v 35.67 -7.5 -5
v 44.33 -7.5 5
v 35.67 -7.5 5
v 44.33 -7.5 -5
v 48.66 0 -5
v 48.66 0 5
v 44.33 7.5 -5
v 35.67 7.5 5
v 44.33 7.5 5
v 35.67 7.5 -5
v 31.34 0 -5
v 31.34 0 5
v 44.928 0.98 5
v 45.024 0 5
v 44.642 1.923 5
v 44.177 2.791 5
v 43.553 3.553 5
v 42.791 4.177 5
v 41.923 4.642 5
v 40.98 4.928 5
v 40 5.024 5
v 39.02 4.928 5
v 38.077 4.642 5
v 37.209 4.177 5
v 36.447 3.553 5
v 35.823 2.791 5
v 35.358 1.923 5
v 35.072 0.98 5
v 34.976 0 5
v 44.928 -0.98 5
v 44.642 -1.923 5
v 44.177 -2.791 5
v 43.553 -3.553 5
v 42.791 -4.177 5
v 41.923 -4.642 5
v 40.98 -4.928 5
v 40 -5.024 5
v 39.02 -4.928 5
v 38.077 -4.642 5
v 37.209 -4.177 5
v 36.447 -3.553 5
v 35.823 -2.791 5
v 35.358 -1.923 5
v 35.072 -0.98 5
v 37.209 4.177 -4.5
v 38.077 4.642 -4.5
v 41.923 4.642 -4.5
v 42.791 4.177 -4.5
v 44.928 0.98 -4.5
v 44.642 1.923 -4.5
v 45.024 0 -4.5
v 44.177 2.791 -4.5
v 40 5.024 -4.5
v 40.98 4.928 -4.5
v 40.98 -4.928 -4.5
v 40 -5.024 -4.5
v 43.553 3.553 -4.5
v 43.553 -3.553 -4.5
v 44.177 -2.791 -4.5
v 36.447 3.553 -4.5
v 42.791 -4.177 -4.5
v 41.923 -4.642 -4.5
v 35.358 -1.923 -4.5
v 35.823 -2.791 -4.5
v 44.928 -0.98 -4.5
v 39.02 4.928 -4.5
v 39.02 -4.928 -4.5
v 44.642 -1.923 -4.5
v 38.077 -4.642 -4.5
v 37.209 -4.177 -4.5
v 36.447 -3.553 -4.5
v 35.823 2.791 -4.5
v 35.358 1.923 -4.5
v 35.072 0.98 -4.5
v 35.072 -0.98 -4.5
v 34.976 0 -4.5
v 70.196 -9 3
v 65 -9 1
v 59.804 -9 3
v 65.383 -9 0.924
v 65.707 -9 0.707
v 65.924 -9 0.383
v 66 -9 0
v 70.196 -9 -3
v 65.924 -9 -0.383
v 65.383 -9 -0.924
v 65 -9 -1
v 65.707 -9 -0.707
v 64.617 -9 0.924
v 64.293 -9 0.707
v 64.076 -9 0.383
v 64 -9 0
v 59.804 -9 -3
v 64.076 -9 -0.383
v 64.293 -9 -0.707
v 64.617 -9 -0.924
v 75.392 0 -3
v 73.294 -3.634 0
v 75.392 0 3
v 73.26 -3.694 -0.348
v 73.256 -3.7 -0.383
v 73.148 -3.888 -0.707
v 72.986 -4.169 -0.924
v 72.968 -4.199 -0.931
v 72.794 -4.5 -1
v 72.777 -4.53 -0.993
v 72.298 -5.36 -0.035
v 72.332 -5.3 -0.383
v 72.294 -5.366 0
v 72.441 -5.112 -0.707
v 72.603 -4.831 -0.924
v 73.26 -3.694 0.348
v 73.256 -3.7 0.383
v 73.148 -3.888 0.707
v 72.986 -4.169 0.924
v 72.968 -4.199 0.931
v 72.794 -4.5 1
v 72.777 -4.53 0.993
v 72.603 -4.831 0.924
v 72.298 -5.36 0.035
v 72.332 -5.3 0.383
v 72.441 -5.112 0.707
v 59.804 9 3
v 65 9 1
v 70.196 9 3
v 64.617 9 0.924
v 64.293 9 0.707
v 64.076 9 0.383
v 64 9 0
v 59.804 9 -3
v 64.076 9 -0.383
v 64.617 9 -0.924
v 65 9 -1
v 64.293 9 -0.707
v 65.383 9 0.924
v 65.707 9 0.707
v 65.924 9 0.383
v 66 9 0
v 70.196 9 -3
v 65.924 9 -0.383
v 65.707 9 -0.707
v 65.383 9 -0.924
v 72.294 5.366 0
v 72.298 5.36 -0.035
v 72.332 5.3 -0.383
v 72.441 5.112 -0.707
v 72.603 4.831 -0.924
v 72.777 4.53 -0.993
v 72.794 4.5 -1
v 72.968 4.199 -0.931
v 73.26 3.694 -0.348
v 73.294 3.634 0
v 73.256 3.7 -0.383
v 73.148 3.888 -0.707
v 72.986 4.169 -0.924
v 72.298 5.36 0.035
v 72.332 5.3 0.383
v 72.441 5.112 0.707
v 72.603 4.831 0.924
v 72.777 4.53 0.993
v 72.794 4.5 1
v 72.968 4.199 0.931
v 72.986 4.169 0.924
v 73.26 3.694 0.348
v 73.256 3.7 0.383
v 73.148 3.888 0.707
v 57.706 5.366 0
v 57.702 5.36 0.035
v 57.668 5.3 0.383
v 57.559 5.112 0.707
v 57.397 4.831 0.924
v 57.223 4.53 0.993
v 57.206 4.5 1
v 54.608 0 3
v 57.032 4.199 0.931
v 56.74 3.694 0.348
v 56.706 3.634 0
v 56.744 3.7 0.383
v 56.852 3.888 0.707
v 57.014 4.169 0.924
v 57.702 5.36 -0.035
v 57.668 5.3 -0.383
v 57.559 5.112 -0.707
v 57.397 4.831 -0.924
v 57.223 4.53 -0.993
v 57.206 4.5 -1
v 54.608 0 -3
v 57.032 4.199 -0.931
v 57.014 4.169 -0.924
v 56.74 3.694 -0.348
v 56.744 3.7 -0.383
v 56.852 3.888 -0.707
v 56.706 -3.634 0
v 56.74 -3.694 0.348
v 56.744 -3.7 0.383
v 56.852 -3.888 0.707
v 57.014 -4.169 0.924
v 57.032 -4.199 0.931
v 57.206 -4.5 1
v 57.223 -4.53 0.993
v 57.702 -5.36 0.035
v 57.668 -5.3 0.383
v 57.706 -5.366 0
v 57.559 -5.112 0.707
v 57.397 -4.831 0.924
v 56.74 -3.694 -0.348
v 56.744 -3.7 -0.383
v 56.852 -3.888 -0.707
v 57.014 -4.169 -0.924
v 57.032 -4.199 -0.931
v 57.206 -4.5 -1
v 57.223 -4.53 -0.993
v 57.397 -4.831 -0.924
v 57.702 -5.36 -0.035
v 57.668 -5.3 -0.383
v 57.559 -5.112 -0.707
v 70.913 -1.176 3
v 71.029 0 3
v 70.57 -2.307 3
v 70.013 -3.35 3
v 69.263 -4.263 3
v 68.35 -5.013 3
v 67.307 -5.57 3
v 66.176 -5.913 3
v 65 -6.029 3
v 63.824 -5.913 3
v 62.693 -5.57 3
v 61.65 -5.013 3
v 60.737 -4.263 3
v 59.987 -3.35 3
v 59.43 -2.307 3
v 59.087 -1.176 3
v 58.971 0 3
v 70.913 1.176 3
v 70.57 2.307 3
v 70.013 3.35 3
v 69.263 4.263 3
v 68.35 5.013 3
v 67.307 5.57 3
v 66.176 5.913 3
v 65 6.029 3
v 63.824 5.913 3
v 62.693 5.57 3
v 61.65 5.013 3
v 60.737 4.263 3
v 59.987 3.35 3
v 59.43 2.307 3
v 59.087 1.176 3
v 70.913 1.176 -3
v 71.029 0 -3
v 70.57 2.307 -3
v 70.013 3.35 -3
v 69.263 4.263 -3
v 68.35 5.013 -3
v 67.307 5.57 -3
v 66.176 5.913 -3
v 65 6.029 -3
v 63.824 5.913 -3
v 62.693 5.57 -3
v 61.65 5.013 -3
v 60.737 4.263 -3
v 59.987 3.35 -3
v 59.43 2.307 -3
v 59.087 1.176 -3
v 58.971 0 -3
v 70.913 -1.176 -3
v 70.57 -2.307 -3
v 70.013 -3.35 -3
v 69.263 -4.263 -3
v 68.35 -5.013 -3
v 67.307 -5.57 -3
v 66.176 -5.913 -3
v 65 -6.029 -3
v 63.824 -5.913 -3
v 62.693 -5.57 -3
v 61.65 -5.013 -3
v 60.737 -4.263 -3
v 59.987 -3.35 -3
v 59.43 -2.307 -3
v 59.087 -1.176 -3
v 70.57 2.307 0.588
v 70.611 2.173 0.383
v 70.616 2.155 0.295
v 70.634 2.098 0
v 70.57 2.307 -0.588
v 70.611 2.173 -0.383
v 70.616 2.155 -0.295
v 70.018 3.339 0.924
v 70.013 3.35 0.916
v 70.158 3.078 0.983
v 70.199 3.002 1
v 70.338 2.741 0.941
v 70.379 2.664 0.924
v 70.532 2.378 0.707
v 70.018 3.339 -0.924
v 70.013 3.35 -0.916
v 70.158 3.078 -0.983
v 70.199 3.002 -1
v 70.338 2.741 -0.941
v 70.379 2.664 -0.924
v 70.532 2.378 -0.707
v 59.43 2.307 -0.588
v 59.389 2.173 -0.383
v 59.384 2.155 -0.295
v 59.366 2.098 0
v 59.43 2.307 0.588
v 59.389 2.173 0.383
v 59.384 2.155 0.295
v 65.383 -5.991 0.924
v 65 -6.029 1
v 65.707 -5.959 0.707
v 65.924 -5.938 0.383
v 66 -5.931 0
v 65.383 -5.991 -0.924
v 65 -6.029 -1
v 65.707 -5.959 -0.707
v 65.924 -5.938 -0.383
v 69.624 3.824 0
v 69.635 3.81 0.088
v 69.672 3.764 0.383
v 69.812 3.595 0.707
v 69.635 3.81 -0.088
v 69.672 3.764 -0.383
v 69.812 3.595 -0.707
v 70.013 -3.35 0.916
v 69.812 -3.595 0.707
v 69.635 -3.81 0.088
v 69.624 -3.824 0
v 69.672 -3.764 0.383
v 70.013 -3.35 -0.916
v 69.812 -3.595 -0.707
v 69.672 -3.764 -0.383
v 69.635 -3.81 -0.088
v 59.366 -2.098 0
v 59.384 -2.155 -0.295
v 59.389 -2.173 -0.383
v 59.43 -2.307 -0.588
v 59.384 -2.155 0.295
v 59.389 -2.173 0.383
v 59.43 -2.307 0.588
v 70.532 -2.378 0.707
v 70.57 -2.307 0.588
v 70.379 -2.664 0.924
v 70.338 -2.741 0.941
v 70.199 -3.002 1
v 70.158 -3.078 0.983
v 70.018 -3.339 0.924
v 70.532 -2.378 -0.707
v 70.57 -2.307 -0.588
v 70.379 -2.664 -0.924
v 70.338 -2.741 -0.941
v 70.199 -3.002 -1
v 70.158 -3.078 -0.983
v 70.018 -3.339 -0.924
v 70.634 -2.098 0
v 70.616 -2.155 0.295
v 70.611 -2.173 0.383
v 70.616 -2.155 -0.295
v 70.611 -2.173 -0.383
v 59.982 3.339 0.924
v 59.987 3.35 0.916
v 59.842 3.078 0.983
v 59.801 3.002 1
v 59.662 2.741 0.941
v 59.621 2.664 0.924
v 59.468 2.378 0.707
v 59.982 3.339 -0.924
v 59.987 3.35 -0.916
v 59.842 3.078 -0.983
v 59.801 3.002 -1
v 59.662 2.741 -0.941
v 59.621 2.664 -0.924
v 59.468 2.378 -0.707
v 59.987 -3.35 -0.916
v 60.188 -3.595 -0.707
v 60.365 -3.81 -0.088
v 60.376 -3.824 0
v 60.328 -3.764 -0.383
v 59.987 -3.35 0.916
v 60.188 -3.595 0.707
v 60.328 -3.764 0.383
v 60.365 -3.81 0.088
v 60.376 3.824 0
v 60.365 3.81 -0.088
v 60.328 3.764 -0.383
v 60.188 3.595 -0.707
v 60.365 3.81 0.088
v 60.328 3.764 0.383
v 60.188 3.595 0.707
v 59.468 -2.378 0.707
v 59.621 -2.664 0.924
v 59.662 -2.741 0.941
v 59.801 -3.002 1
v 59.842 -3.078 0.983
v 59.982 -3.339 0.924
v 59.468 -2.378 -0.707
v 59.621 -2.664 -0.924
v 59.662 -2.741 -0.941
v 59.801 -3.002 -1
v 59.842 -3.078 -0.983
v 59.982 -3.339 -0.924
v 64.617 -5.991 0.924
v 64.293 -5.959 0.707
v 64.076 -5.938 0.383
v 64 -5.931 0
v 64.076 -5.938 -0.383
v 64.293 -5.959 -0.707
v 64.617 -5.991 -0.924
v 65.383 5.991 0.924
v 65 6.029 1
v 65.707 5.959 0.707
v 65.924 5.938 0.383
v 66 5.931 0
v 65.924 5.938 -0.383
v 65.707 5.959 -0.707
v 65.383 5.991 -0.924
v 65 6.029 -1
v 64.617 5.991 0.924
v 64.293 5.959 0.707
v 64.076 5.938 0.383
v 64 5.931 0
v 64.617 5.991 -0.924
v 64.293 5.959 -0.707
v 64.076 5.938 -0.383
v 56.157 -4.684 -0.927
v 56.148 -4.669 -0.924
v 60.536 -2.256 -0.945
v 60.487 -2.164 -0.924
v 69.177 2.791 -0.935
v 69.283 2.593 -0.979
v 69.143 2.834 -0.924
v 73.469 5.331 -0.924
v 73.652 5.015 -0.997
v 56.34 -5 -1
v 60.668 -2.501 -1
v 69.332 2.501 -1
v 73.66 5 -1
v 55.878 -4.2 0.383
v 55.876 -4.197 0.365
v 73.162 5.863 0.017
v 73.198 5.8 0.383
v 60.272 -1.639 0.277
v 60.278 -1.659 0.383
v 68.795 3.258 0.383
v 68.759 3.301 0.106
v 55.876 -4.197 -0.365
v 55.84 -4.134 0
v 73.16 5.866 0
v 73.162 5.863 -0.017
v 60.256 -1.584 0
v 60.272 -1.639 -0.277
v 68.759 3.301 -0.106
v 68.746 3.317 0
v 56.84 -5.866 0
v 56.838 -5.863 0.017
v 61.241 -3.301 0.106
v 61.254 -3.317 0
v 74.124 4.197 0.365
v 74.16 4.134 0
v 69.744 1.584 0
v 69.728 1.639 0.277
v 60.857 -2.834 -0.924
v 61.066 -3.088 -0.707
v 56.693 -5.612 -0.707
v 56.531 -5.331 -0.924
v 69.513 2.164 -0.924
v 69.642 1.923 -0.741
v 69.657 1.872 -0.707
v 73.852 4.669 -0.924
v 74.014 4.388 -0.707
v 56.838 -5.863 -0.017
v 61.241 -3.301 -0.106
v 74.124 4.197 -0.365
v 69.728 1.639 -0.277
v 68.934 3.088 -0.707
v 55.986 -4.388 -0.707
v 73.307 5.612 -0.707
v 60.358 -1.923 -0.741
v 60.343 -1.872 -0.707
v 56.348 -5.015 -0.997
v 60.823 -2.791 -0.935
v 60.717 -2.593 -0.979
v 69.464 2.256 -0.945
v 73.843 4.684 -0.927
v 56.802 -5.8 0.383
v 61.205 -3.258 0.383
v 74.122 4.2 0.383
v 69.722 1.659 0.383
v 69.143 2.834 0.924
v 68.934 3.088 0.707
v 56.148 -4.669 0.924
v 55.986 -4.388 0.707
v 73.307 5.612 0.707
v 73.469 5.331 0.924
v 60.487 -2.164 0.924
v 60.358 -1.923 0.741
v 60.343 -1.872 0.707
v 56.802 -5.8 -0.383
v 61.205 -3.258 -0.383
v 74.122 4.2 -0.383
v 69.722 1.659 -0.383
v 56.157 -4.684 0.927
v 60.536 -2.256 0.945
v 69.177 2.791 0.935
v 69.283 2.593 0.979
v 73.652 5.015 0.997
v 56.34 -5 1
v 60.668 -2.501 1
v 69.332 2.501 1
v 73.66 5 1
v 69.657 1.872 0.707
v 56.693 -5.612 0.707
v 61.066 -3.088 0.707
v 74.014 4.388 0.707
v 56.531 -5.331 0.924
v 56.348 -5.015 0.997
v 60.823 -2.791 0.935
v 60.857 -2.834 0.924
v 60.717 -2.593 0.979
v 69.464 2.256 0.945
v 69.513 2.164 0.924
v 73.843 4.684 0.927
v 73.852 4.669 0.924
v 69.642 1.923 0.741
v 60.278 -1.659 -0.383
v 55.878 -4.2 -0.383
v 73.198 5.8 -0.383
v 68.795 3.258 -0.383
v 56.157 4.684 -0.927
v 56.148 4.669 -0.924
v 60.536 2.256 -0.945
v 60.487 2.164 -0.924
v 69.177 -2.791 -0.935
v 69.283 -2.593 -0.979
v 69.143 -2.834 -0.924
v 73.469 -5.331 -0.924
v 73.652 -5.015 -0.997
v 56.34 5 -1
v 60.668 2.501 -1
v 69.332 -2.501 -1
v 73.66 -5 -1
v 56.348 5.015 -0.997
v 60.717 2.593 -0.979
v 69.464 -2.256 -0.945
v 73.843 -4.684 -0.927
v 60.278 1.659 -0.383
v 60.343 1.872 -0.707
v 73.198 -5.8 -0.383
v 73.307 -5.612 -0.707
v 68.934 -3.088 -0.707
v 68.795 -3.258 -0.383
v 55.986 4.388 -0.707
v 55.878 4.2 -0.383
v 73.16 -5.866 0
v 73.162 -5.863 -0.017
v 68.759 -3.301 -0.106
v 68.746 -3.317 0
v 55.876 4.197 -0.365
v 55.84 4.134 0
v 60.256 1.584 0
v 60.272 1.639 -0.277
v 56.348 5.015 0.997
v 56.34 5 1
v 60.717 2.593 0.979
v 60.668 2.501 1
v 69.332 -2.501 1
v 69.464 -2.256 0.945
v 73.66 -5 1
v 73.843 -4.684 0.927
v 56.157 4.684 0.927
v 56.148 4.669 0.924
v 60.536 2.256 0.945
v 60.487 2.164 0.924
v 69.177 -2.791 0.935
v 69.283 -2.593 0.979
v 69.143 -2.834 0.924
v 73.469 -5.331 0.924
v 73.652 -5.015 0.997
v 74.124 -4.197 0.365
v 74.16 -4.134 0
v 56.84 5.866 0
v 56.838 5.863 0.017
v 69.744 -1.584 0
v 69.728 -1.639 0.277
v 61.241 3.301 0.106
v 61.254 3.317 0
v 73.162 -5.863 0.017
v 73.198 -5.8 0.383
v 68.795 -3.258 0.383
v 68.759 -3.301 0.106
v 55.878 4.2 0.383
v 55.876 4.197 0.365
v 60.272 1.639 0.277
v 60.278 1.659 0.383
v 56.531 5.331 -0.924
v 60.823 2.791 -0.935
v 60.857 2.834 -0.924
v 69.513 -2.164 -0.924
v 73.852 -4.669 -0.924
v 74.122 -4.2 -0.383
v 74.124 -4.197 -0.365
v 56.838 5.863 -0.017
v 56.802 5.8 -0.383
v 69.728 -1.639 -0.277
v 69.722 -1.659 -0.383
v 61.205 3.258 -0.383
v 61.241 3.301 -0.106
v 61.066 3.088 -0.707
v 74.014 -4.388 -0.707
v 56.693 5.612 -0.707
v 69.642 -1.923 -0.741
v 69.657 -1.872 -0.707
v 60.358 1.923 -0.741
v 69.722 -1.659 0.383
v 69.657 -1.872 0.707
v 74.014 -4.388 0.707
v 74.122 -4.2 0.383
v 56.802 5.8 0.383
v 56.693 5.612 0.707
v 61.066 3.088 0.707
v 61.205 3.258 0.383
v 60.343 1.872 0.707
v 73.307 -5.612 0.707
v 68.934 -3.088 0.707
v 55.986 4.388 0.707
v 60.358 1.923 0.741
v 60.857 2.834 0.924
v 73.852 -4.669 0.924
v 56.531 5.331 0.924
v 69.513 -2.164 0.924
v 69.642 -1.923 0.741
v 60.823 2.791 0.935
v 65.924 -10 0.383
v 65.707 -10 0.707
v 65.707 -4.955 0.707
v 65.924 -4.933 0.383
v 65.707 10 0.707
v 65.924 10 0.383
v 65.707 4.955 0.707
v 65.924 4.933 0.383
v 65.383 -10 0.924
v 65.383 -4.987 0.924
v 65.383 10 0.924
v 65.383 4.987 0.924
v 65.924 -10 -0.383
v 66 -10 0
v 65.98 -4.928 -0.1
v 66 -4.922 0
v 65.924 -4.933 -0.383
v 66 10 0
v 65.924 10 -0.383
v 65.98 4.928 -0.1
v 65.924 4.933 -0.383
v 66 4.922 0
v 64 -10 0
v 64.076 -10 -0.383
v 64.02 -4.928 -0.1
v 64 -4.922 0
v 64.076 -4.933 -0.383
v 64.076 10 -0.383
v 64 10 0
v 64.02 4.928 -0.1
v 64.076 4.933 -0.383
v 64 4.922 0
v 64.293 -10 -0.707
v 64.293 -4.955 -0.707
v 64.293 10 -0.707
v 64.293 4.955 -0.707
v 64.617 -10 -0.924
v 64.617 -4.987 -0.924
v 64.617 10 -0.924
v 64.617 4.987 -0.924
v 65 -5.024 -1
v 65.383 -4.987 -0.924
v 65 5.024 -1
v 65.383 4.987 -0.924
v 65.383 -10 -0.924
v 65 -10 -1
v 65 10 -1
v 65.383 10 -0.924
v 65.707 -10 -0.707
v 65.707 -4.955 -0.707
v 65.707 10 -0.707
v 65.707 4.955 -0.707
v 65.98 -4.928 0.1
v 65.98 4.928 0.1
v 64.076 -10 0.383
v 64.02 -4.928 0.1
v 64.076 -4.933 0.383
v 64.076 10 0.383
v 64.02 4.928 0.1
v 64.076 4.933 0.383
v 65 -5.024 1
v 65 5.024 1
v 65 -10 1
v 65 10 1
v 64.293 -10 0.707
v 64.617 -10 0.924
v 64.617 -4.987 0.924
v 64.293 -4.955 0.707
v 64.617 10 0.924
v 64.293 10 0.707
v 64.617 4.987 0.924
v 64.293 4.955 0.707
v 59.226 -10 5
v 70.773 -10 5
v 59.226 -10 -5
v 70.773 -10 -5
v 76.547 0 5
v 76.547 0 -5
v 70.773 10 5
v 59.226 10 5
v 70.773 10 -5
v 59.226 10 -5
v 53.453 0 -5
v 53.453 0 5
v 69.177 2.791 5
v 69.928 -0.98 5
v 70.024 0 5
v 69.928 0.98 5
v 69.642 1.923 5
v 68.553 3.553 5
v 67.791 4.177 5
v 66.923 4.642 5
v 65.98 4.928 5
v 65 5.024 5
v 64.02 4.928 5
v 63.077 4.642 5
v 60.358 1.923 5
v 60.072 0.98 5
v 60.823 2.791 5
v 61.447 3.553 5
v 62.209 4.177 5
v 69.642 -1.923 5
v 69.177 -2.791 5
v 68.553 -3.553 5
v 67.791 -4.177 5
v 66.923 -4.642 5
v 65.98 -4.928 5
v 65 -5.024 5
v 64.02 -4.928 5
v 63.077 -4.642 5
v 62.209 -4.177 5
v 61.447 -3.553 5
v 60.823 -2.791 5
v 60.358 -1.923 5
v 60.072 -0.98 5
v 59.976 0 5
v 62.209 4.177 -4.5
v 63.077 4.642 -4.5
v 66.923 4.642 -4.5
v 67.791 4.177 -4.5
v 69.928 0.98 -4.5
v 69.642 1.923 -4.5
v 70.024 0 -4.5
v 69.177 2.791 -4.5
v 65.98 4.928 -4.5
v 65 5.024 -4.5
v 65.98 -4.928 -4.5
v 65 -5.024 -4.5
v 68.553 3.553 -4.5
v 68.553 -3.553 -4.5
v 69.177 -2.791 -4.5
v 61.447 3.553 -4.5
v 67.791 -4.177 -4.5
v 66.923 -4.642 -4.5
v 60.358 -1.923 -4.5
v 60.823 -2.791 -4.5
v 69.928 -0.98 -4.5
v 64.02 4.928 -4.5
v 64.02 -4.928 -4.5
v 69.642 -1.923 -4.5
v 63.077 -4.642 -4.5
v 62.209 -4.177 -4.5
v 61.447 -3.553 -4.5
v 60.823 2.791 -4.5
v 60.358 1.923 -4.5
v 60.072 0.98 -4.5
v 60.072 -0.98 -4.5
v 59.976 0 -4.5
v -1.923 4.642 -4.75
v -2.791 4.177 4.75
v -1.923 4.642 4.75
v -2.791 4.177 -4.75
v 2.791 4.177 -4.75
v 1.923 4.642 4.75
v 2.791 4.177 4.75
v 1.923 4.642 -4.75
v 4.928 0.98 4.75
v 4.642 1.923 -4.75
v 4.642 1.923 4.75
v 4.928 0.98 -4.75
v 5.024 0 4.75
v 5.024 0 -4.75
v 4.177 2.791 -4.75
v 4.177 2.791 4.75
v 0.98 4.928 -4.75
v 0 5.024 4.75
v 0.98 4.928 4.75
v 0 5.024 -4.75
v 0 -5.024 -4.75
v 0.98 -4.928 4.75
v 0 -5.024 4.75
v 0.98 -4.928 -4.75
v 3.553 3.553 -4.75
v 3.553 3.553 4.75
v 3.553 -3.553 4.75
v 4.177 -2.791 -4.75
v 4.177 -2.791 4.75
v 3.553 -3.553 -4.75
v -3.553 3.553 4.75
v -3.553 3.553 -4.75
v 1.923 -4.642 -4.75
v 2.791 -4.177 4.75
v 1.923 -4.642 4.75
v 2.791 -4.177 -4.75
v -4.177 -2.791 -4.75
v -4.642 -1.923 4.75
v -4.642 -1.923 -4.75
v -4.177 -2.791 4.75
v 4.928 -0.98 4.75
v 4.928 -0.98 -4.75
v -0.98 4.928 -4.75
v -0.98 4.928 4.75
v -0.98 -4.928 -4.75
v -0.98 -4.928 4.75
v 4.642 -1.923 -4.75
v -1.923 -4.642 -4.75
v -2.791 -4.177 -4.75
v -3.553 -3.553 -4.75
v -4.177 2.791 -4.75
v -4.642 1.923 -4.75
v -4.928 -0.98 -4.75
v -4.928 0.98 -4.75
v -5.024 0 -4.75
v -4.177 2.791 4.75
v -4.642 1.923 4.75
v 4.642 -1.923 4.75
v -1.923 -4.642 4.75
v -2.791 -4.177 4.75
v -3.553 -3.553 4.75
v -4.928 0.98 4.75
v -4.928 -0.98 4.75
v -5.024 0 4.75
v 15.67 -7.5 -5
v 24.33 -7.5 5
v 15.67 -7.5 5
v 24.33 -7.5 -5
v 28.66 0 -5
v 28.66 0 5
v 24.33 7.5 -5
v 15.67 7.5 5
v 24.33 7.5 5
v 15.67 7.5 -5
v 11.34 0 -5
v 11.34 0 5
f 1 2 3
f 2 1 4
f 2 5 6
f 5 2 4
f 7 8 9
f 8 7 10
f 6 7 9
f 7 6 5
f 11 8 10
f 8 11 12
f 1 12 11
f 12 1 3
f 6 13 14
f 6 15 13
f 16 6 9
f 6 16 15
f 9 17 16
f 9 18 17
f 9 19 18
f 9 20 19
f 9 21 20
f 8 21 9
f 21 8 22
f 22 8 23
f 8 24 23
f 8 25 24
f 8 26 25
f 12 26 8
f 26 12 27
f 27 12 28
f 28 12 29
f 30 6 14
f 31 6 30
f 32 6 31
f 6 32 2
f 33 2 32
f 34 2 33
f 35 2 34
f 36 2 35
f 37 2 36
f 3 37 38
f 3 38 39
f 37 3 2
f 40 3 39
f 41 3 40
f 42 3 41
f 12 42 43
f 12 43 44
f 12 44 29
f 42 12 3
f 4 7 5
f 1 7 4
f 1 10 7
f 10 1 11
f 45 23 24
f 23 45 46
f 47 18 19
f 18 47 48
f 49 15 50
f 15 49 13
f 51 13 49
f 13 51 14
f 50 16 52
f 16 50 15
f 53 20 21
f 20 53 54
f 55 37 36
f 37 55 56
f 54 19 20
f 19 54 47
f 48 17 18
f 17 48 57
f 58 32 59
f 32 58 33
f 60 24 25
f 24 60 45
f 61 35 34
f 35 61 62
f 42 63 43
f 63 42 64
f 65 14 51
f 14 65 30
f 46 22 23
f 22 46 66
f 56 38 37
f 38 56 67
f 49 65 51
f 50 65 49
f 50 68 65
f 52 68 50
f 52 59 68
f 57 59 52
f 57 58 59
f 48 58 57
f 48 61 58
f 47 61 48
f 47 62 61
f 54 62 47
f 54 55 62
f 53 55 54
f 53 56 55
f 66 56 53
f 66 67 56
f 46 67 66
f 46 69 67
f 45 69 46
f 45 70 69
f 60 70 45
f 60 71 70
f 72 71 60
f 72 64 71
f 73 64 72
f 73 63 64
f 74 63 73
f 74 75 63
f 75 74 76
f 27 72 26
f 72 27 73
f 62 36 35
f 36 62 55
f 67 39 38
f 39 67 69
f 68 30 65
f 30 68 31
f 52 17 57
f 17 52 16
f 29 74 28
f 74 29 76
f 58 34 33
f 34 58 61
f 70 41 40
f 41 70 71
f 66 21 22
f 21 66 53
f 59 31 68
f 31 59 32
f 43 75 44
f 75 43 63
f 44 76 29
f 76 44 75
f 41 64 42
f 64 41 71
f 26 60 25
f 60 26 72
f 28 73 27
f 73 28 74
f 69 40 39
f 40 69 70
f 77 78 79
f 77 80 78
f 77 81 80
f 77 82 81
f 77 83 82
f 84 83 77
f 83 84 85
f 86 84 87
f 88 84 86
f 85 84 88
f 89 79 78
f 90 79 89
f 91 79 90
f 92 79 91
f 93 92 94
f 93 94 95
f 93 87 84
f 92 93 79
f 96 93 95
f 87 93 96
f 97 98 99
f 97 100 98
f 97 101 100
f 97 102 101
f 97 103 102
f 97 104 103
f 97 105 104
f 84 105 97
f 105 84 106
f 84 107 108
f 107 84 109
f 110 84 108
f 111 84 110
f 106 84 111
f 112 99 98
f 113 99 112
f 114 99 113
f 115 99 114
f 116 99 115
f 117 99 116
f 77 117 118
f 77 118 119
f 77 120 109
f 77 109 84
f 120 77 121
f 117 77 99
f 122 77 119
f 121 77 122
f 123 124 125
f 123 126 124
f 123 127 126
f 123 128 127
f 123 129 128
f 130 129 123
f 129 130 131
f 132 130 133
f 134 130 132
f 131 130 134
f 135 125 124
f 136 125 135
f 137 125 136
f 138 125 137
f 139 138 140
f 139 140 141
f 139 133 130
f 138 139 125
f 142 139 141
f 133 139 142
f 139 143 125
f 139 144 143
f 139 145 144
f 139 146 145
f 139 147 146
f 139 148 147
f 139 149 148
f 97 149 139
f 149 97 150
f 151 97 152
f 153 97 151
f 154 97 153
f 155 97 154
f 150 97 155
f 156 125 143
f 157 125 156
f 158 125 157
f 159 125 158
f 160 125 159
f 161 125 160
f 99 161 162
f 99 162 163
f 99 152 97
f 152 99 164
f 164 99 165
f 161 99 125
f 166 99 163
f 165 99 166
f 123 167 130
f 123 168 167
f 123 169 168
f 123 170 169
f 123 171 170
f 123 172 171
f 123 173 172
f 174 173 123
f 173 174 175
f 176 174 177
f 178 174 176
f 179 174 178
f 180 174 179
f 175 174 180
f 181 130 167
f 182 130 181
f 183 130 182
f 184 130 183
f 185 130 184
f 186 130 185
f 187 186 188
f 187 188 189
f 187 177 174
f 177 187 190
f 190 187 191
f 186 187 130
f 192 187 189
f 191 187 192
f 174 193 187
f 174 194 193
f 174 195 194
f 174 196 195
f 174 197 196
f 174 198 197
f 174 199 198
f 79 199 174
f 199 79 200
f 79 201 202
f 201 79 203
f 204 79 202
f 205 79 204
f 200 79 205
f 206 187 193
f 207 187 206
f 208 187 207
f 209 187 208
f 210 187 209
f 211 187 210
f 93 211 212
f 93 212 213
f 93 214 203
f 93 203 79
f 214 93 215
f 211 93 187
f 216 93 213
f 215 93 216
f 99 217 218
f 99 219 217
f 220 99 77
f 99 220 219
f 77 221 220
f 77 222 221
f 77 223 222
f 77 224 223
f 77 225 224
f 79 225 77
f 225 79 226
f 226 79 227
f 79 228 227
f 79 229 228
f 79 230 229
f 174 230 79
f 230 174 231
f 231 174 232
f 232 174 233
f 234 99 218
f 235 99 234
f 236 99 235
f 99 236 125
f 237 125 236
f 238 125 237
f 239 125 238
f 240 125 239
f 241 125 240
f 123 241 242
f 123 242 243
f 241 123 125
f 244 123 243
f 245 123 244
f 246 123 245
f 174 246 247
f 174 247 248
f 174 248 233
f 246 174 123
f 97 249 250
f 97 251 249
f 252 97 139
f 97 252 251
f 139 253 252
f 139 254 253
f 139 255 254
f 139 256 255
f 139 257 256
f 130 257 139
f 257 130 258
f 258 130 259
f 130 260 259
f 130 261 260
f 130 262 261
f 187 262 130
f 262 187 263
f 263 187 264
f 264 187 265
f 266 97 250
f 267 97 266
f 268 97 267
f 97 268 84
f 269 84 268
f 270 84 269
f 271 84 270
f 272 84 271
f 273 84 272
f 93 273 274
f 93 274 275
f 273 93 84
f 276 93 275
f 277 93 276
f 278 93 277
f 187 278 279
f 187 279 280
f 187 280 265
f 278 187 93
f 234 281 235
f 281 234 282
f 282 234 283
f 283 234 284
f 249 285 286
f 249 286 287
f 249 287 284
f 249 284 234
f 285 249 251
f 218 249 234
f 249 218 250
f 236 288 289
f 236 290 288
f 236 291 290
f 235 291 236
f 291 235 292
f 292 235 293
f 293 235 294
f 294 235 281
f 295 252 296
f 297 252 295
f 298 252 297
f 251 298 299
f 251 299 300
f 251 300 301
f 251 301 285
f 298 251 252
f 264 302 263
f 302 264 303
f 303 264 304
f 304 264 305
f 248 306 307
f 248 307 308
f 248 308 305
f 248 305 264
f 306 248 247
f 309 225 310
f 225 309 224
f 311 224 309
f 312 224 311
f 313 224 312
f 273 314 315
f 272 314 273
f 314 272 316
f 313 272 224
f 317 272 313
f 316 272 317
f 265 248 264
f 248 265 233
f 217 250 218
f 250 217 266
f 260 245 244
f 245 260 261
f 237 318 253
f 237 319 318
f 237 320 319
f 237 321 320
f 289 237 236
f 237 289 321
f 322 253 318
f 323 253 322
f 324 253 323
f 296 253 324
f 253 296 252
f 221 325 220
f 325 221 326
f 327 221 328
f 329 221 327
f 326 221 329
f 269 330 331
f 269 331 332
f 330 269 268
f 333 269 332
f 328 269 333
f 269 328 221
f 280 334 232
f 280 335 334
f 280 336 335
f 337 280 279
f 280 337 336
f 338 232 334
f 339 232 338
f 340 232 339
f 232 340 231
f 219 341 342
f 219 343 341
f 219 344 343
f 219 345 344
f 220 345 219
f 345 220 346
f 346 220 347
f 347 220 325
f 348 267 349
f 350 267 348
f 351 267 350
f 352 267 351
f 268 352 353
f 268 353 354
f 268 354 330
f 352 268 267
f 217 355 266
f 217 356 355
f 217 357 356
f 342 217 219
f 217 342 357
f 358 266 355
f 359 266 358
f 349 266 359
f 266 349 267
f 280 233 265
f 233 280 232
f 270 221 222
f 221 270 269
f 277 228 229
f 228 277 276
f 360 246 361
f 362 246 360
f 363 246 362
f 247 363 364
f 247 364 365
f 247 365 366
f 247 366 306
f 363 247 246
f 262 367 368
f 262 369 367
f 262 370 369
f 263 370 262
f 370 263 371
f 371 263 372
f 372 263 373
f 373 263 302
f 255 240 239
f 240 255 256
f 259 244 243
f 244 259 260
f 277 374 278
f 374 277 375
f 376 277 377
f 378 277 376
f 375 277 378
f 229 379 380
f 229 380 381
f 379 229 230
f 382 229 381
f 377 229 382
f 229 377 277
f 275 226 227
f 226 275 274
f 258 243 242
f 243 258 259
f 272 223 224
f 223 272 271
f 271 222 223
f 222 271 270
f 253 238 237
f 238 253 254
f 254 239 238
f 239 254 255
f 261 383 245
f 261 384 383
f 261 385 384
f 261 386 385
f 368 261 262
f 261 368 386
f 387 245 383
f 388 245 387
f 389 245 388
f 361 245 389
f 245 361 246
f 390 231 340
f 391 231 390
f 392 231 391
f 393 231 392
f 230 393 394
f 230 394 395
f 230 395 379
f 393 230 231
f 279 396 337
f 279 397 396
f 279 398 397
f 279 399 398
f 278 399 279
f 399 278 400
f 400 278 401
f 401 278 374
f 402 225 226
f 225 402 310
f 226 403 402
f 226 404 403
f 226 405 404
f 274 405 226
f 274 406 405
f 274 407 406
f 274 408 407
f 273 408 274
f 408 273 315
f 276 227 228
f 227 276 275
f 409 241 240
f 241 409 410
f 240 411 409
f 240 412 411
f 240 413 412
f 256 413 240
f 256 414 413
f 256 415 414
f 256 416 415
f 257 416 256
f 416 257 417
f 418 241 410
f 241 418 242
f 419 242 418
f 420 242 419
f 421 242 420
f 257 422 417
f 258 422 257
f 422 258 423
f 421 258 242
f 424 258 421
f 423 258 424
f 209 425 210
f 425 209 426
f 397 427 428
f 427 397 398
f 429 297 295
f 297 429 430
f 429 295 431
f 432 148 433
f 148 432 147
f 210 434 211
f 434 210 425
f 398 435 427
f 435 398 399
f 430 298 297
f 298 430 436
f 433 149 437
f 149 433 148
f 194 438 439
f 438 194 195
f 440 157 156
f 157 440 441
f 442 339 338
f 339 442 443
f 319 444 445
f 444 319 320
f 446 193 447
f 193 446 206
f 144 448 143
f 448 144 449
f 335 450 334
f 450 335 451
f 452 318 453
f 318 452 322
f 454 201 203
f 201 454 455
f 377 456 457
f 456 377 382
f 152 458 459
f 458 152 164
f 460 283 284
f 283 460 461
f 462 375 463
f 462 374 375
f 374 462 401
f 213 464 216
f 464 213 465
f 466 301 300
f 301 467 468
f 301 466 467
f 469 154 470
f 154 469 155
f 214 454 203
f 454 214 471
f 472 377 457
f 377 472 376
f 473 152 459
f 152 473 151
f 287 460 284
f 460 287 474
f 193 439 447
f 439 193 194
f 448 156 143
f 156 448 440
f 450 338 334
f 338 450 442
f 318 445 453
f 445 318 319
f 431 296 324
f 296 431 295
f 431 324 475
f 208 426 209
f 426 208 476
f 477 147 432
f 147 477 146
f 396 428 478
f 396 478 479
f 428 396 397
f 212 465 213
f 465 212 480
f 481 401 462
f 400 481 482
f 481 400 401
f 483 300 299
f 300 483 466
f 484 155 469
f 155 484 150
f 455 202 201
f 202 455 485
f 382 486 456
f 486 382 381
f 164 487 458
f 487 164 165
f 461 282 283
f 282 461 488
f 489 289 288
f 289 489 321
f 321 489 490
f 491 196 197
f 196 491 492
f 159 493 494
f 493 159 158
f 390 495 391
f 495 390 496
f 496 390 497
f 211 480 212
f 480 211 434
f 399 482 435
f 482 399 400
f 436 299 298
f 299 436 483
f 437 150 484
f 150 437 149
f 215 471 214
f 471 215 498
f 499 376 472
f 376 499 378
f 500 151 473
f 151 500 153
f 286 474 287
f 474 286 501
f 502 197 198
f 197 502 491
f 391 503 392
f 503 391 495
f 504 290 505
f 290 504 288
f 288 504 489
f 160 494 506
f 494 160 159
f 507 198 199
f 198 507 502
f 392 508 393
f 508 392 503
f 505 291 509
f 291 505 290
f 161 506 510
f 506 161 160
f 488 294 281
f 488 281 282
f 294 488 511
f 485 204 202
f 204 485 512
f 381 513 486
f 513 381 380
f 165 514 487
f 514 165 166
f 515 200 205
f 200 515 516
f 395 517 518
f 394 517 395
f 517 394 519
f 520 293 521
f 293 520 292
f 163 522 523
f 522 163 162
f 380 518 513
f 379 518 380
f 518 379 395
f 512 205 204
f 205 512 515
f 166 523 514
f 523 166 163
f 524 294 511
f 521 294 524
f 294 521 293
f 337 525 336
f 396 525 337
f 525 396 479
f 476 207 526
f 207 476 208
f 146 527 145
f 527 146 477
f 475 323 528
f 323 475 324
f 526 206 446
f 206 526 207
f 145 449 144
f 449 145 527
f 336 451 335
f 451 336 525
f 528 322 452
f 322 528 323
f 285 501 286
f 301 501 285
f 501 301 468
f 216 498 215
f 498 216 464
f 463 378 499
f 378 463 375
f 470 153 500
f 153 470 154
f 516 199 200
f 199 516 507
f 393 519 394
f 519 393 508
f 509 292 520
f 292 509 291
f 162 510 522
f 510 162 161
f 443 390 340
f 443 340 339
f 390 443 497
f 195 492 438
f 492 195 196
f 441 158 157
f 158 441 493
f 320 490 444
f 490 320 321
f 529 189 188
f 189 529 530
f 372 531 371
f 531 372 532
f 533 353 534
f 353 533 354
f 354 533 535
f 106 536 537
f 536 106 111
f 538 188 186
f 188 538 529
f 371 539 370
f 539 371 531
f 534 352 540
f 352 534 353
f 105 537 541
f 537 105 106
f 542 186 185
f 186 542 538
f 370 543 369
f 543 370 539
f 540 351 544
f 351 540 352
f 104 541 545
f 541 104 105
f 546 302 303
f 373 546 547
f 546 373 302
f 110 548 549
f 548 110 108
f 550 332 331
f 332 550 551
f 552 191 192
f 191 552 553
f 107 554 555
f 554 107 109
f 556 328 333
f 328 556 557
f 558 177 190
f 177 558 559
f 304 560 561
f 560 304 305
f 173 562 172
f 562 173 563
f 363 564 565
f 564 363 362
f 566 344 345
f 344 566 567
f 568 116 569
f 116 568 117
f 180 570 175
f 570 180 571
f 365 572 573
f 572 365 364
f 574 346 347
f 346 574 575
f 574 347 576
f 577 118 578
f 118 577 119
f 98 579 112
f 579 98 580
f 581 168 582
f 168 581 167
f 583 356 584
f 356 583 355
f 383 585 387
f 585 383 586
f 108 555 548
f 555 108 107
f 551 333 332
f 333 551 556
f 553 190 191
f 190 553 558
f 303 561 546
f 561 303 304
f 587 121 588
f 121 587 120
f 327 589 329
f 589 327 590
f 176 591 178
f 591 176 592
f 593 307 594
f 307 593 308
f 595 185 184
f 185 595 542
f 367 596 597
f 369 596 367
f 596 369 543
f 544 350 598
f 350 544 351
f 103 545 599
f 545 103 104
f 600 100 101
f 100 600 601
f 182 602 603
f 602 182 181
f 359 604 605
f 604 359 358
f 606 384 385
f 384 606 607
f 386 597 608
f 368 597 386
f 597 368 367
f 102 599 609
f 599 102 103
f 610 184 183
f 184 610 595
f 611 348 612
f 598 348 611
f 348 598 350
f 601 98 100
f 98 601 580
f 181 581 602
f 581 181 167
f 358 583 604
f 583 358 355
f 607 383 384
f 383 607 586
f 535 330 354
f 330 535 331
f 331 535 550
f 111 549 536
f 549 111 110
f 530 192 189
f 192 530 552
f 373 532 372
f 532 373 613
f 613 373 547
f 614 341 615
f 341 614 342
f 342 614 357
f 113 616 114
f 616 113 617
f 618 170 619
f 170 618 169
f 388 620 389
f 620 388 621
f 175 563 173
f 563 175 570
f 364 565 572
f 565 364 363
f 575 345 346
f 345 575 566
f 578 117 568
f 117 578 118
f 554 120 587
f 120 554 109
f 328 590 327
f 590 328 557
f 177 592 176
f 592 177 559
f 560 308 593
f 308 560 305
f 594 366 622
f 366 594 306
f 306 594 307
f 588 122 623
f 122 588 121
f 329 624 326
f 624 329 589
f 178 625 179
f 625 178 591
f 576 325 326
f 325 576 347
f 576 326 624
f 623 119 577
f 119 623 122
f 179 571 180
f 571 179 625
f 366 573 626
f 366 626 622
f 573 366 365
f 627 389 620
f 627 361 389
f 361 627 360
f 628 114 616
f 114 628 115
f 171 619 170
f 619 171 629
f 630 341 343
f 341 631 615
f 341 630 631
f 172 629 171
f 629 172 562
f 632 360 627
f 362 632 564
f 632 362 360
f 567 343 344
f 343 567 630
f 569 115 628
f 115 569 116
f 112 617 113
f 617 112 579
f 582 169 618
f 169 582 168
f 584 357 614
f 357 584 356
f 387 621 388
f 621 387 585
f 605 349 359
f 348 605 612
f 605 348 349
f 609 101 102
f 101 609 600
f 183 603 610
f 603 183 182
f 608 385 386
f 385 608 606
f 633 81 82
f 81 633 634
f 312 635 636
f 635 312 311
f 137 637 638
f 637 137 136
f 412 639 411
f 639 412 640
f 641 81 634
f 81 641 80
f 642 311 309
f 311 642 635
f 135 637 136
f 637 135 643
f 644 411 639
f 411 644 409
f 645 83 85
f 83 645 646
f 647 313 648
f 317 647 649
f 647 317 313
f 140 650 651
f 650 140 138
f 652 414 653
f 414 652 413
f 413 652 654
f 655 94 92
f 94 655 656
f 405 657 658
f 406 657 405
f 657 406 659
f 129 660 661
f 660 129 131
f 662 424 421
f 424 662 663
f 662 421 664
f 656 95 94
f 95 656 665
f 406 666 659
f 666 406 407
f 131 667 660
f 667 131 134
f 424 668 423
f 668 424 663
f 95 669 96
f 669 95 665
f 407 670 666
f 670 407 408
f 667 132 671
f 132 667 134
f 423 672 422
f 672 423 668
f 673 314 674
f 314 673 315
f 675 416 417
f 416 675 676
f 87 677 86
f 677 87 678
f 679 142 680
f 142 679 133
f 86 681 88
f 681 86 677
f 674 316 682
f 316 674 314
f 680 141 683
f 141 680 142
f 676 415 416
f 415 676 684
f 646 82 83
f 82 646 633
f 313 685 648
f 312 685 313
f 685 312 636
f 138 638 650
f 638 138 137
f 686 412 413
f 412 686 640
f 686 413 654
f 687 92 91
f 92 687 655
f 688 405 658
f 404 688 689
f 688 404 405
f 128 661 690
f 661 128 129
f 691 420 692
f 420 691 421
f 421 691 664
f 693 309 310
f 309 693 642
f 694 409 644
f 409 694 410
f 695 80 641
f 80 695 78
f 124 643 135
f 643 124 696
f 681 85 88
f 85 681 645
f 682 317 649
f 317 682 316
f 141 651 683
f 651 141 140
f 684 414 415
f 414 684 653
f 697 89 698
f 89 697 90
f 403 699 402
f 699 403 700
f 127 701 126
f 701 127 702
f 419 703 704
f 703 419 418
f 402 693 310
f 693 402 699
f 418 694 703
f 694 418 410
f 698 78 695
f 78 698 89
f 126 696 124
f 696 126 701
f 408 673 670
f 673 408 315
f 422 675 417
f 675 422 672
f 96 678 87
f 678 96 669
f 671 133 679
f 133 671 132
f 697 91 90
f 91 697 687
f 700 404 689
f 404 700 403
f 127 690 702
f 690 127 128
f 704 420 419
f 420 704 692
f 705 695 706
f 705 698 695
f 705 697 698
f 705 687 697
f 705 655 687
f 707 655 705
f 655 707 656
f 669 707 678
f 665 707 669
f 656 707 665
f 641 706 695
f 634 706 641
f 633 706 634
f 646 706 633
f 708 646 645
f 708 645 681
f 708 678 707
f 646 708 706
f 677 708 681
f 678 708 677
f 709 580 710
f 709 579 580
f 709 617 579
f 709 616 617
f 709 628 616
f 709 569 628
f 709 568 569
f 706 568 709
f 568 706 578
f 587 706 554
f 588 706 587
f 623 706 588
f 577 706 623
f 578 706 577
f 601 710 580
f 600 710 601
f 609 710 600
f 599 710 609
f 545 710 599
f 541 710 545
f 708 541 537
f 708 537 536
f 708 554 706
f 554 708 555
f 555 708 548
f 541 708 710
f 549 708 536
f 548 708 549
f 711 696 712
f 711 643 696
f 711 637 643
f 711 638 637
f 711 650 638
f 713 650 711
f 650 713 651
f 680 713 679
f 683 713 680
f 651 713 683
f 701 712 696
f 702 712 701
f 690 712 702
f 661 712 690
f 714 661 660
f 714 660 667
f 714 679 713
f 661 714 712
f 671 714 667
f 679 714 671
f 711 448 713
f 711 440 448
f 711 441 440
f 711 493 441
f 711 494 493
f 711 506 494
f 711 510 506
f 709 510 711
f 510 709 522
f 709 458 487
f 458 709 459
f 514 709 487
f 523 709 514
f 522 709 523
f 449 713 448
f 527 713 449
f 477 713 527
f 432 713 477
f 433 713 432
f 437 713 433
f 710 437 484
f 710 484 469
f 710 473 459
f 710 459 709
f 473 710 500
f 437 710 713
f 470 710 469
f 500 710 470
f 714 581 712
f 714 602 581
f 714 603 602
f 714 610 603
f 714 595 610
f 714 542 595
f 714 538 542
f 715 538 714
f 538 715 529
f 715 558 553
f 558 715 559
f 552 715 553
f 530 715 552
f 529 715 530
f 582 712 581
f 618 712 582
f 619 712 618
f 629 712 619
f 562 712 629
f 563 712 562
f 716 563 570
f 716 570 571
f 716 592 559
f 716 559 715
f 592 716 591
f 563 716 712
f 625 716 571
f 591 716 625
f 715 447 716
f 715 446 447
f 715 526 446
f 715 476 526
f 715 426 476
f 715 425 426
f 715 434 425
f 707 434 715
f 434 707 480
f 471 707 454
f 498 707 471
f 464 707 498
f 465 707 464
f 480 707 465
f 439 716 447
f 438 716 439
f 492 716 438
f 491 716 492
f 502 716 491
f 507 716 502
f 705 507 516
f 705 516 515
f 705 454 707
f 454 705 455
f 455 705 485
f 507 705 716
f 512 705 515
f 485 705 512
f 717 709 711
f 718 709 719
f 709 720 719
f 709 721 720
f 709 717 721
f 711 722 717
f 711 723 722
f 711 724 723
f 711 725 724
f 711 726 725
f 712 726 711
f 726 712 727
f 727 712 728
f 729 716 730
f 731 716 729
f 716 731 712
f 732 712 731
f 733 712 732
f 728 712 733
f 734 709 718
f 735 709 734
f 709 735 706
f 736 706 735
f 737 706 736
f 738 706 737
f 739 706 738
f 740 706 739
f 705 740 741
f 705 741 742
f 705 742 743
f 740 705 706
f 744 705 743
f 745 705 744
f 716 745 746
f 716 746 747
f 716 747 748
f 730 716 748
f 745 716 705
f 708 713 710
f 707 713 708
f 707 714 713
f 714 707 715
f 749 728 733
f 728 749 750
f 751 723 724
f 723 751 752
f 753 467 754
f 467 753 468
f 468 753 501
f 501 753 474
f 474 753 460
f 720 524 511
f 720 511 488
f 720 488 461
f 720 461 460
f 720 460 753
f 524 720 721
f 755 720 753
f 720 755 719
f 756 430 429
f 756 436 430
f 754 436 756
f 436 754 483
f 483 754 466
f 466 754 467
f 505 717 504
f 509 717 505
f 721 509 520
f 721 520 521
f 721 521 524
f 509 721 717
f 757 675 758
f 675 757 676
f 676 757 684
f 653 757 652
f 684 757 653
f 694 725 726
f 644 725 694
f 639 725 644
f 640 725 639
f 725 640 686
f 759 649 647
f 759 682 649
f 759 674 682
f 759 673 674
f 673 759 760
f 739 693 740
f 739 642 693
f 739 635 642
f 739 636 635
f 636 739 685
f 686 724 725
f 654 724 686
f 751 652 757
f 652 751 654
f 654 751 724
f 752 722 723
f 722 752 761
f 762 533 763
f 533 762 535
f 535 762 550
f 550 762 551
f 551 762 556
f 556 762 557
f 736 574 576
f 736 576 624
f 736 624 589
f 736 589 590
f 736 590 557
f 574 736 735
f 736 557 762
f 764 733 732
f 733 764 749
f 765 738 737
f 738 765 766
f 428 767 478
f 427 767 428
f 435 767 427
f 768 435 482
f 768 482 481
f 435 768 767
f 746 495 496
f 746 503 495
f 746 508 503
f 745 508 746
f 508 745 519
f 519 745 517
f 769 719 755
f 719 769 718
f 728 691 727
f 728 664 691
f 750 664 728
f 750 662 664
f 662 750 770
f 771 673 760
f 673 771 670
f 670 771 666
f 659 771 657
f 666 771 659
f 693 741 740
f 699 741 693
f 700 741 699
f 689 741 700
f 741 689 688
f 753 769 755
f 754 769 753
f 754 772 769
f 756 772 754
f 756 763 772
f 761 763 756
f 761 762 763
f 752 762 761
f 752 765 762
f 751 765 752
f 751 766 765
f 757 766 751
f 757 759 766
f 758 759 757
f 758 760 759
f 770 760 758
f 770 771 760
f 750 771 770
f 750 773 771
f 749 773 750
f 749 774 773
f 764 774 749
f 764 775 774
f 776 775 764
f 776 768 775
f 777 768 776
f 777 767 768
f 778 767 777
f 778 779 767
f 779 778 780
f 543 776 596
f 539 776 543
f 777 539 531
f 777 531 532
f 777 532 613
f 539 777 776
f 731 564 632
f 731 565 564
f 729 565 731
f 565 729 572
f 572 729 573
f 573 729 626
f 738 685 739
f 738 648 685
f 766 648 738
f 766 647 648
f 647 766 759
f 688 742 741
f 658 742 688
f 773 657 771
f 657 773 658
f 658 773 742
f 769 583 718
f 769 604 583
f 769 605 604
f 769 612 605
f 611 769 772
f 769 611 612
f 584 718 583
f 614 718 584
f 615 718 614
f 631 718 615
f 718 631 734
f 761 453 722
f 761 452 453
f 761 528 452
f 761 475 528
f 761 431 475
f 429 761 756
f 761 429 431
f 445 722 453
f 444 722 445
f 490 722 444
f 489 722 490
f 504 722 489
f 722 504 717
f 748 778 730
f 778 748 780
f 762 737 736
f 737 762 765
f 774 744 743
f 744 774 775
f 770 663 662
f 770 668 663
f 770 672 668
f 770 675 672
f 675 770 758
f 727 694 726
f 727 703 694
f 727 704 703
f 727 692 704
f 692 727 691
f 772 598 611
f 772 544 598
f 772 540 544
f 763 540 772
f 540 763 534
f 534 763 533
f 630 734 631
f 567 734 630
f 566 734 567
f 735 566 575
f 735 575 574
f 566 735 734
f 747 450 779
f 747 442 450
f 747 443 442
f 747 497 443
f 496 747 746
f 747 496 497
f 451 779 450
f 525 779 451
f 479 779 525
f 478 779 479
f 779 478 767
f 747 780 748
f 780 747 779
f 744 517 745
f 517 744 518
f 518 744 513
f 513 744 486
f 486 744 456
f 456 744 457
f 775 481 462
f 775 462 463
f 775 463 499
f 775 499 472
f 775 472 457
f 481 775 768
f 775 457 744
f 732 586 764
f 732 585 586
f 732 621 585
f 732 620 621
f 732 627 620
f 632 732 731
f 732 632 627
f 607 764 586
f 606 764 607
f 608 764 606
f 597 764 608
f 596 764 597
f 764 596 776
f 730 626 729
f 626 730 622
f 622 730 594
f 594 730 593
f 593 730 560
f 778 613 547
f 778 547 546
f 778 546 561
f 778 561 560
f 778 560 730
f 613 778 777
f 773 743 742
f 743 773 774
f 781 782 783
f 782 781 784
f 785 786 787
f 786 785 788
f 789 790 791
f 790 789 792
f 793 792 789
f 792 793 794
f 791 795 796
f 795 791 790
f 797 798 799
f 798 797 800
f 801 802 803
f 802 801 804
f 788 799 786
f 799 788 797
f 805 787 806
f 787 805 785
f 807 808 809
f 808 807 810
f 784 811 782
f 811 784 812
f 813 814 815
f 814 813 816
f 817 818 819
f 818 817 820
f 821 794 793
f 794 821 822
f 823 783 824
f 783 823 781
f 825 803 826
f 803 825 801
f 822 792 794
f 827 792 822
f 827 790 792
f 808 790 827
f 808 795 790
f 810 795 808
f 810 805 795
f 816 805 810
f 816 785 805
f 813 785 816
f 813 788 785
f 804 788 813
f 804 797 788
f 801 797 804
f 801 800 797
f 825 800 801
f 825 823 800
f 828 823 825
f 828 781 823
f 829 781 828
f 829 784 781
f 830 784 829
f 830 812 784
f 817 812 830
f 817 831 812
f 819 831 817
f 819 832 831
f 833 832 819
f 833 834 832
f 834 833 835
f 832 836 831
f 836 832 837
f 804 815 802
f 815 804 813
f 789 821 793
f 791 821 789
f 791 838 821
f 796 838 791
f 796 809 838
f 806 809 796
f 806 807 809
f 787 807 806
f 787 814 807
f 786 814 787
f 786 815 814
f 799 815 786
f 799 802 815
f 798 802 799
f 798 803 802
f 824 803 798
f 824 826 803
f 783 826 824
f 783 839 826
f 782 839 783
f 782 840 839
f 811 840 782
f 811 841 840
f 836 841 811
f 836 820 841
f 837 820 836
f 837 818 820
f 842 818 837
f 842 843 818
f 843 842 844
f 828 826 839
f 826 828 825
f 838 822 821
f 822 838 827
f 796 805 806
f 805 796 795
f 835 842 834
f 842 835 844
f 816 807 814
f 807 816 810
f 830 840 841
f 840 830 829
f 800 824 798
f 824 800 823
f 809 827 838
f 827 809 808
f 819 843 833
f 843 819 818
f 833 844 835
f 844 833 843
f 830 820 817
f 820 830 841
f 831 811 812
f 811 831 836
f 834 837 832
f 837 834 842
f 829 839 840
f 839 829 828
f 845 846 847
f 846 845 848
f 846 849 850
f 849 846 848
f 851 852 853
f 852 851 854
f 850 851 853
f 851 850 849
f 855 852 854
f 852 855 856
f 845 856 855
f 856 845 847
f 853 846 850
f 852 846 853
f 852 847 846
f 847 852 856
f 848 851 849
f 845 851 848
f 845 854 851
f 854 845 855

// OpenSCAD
// file: util.scad
use <tests.scad>

module cylinder_outer( h, r=undef, d=undef, center=true, fn=$fn) {
   if ( is_undef(r) && is_undef(d) ) {
     assert(false,"must specify r or d when calling cylinder_outer");
   }
   radius = is_undef(r) ? d/2 : r;
   fudge = 1 / cos( 180 / fn );
   
   echo(str("DEBUG: making outer cylinder - radius: ", radius, "; fudge", fudge, "; fn:", fn));
   cylinder( h=h, r=radius*fudge, center=center, $fn=fn );
}

module reduce_moire(direction=[0,0,1]) {
    translate( 1/128 * direction )
    children();
}


/**
 * add_tolerance
 * 
 * adds a specified amount to an object dimension
 * 
 * object_size: the original object dimension
 * tolerance: (scoped*) the amount to add
 */
__add_tolerance = function( object_size, tolerance = $scoped_tolerance ) (
    object_size + ( is_undef(tolerance) ? 0 : tolerance )
);
function add_tolerance( object_size, tolerance = $scoped_tolerance ) =
    __add_tolerance( object_size, tolerance );

/**
 * subtract_tolerance
 * 
 * removes a specified amount from an object
 * 
 * object_size: the original object dimension
 * tolerance: (scoped*) the amount to remove
 */
__subtract_tolerance = function( object_size, tolerance = $scoped_tolerance ) (
    object_size - ( is_undef(tolerance) ? 0 : tolerance )
);
function subtract_tolerance( object_size, tolerance = $scoped_tolerance ) =
    __subtract_tolerance( object_size, tolerance );


__sum_list = function ( list, limit = undef, index = 0, sum = 0 ) (
    ! is_list(list) // this is essentially to prevent an infinite loop on failure
        ? 0
        : index >= ( is_num(limit) ? min( len(list), limit ) : len(list) )
        ? sum
        : is_num( list[index] ) // if the list has mixed values, don't include them
        ? __sum_list( list, limit, index + 1, sum + list[index] )
        : __sum_list( list, limit, index + 1, sum )
);
function sum_list( list, limit = undef, index = 0, sum = 0 ) =
    __sum_list(list,limit,index,sum);
    
__sae_list_to_mm = function ( list, precision = 2 ) (
  [ for( i = list ) sae_to_mm(i,precision) ]
);
function sae_list_to_mm( list, precision = 2 ) =
  __sae_list_to_mm( list, precision );

__sae_to_mm = function( inches, precision = 2 ) let (
    magnitude = pow( 10, precision )
) (
    round( magnitude * ( inches * 25.4 ) ) / magnitude
);
function sae_to_mm( inches, precision = 2 ) =
  __sae_to_mm( inches, precision );

__mm_to_sae = function( inches, precision = 2 ) let (
    magnitude = pow( 10, precision )
) (
    round( magnitude * ( 25.4 / mm ) ) / magnitude
);
function mm_to_sae( inches, precision = 2 ) =
  __mm_to_sae( inches, precision );

  
// the following tests will be run if you preview this file directly
  
mm_list  = [1,2,3,5,7,11,13,17,19,23,29];
in_list  = [3/16,1/2,3/4,29/32];
bad_list = ["mom",2,3,"steve",4,11,undef];

sum_tests = [ 
    [130,mm_list], 
    [1,mm_list,1], 
    [11,mm_list,4],
    [20,bad_list],
    [0,"not a list",0]
];
convert_tests = [
  [ [4.76,12.7,19.05,23.02], in_list ]
];

test_runner( __sum_list, sum_tests );
test_runner( __sae_list_to_mm, convert_tests );

echo("Successfully executed all util.scad tests");
// file: tests.scad
module test_runner( func, tests ) {
    for( test = tests ) {
        expected = test[0];
        if ( len( test ) > 9 ) {
            echo("WARNING: A test was performed with more than 8 parameters, all additional parameters are ignored.");
        };
        value = len( test ) == 1 ? func() 
              : len( test ) == 2 ? func(test[1])
              : len( test ) == 3 ? func(test[1],test[2])
              : len( test ) == 4 ? func(test[1],test[2],test[3])
              : len( test ) == 5 ? func(test[1],test[2],test[3],test[4])
              : len( test ) == 6 ? func(test[1],test[2],test[3],test[4],test[5])
              : len( test ) == 7 ? func(test[1],test[2],test[3],test[4],test[5],test[6])
              : len( test ) == 8 ? func(test[1],test[2],test[3],test[4],test[5],test[6],test[7])
              : func(test[1],test[2],test[3],test[4],test[5],test[6],test[7],test[8]);
        
        assert( value == expected, str("expected: ", expected, "; received: ", value ) );
    }
}
// file: defaults.scad
use <util.scad>

module use_all_defaults() {
  use_general_defaults() 
  use_socket_defaults() 
  use_label_defaults() 
  use_magnet_defaults()
  children();
}

module use_general_defaults() {
    $scoped_tolerance = 0;
    $scoped_for_resin = false;
    $scoped_resin_wall_max_width = 3;
    children();
}

module use_tolerance(value) {
    $scoped_tolerance = value;
    children();
}

module resin_print(value=true) {
    $scoped_for_resin = value;
    children();
}

// sockets.scad
module use_socket_defaults() {
    $scoped_sockets = undef;
    $scoped_socket_set_width = undef;
    $scoped_socket_depth = 10;
    $scoped_socket_drive = false;
    $scoped_socket_drive_tolerance = 0.5;
    $scoped_socket_drive_magnet = undef;
    children();
}

module use_sockets(value) {
    $scoped_sockets = value;
    children();
}

module use_socket_set_width(value) {
    $scoped_socket_set_width = value;
    children();
}

module use_socket_depth(value) {
    $scoped_socket_depth = value;
    children();
}

module use_socket_drive(value) {
    $scoped_socket_drive = sae_to_mm(value) - $scoped_socket_drive_tolerance;
    echo("DEBUG: use_socket_drive called. received ", value, ", returned ", $scoped_socket_drive );
    children();
}

module use_socket_drive_tolerance(value) {
    $scoped_socket_tolerance = value;
    children();
}

module use_socket_drive_magnet(value) {
    $scoped_socket_drive_magnet = value;
    children();
}

module use_label_defaults() {
    $scoped_labels = undef;
    $scoped_label_placement = false;
    $scoped_label_placement_distance = 5;
    $scoped_label_depth = 4;
    $scoped_label_offset = [0,0,0];
    $scoped_label_rotation = [0,0,0];
    $scoped_label_font_size = 5;
    $scoped_label_font = "Rockwell:style=Bold";
    $scoped_label_halign = "center";
    $scoped_label_valign = "baseline";
    $scoped_label_spacing = 0.9;
    children();
}

module use_labels(value) {
    $scoped_labels = value;
    children();
}

module use_label_placement(value) {
    $scoped_label_placement = value;
    children();
}

module use_label_placement_distance(value) {
    $scoped_label_placement_distance = value;
    children();
}

module use_label_depth(value) {
    $scoped_label_depth = value;
    children();
}

module use_label_offset(value) {
    $scoped_label_offset = value;
    children();
}

module use_label_rotation(value) {
    $scoped_label_rotation = value;
    children();
}

module use_label_font_size(value) {
    $scoped_label_font_size = value;
    children();
}

module use_label_font(value) {
    $scoped_label_font = value;
    children();
}

module use_label_halign(value) {
    $scoped_label_halign = value;
    children();
}

module use_label_valign(value) {
    $scoped_label_valign = value;
    children();
}

module use_label_spacing(value) {
    $scoped_label_spacing = value;
    children();
}

module use_magnet_defaults() {
    // magnet-inserts.scad
    $scoped_magnet_nut_hole_punch = false;
    $scoped_magnet_nut_depth = 10;
    $scoped_magnet_diameter = 7;
    $scoped_magnet_to_surface_gap = 0.5;
    children();
}

module use_magnet_nut_hole_punch(value) {
    $scoped_magnet_nut_hole_punch = value;
    children();
}

module use_magnet_nut_thickness(value) {
    $scoped_magnet_nut_depth = value;
    children();
}

module use_magnet_diameter(value) {
    $scoped_magnet_diameter = value;
    children();
}

module use_magnet_to_surface_gap(value) {
    $scoped_magnet_to_surface_gap = value;
    children();
}
// main file
use <defaults.scad>;
use <tests.scad>;
use <util.scad>;
    
module make_nut( diameter, depth = $scoped_magnet_nut_depth, fn = 6 ) {
    
    nut_diameter = subtract_tolerance( diameter, $scoped_tolerance );
    echo(str("DEBUG: make_nut, diameter: ", nut_diameter, "; depth: ", depth, "; fn: ", fn ));

    cylinder_outer( h = depth, d = diameter, fn=fn );
}

module make_magnet( diameter = $scoped_magnet_diameter, depth = $scoped_magnet_nut_depth - $scoped_magnet_to_surface_gap ) {
    make_nut( diameter=diameter, depth=depth, fn=32 );
}

module inner_hollow( nut_size, wall_thickness = 2, nut_thickness = $scoped_magnet_nut_depth, magnet_diameter = $scoped_magnet_diameter ) {
    difference() {
        make_nut( diameter=nut_size - wall_thickness, depth=nut_thickness - wall_thickness*2 );
        make_magnet( diameter=magnet_diameter + wall_thickness, depth=nut_size );
    }
}

module make_magnet_insert( nut_size, magnet_diameter = $scoped_magnet_diameter, depth = $scoped_magnet_nut_depth, magnet_to_surface_gap = $scoped_magnet_to_surface_gap, hole_punch = $scoped_magnet_nut_hole_punch ) {

    // this is a little bit of a hack so we don't have to make a separate "make_magnet" function - make_nut subtracts the tolerance, so we increase the size of the magnet by twice the tolerance to reset it and go in the opposite direction
    tolerance = $scoped_tolerance * 2;

    difference() {
        make_nut( subtract_tolerance( nut_size ), depth=depth );
        translate([0,0,magnet_to_surface_gap])
            make_magnet( add_tolerance( magnet_diameter ), depth=depth );
        if ( is_num(hole_punch) ) {
            cylinder(depth+2,d=hole_punch,center=true,$fn=32);
        }
        if ($scoped_for_resin && ( nut_size - magnet_diameter ) / 2 > $scoped_resin_wall_max_width) {
            // make it hollow
            inner_hollow(nut_size=nut_size,nut_thickness=depth,magnet_diameter=magnet_diameter);
            // make some drain holes
            for( i = [0:2] ) {
                rotate([0,90,i*120+30]) cylinder(nut_size+2,d=2,center=true,$fn=16);
            }
        }
    }
}

module make_magnet_set( sizes, space_between = 2, depth=$scoped_magnet_nut_depth, center=false ) {
    translation = center ? [
        (sum_list(sizes) + space_between * (len(sizes) - 1))/-2 + sizes[0]/2,
        0,
        0,
    ] : [0,max(sizes)/2,depth/2];
        
    translate(translation) {
        for( i = [0:len(sizes)-1] ) {
            size = sizes[i];
            x = sum_list( sizes, limit=i ) + space_between * i;
            translate([x,0,0]) make_magnet_insert(sizes[i],depth=depth);
        }
    }
}

module test_magnet_inserts() {
    
    use_all_defaults() use_magnet_diameter(10) use_magnet_nut_thickness(10) {
        color("green") translate([0,0,0]) make_magnet();
        color("blue") translate([20,0,0]) make_nut( 15 );
        color("pink") translate([40,0,0]) make_magnet_insert( nut_size=15 );
        
        color("purple") translate([65,0,0]) resin_print() make_magnet_insert( nut_size=20 );
    }
}

use_all_defaults() test_magnet_inserts();
